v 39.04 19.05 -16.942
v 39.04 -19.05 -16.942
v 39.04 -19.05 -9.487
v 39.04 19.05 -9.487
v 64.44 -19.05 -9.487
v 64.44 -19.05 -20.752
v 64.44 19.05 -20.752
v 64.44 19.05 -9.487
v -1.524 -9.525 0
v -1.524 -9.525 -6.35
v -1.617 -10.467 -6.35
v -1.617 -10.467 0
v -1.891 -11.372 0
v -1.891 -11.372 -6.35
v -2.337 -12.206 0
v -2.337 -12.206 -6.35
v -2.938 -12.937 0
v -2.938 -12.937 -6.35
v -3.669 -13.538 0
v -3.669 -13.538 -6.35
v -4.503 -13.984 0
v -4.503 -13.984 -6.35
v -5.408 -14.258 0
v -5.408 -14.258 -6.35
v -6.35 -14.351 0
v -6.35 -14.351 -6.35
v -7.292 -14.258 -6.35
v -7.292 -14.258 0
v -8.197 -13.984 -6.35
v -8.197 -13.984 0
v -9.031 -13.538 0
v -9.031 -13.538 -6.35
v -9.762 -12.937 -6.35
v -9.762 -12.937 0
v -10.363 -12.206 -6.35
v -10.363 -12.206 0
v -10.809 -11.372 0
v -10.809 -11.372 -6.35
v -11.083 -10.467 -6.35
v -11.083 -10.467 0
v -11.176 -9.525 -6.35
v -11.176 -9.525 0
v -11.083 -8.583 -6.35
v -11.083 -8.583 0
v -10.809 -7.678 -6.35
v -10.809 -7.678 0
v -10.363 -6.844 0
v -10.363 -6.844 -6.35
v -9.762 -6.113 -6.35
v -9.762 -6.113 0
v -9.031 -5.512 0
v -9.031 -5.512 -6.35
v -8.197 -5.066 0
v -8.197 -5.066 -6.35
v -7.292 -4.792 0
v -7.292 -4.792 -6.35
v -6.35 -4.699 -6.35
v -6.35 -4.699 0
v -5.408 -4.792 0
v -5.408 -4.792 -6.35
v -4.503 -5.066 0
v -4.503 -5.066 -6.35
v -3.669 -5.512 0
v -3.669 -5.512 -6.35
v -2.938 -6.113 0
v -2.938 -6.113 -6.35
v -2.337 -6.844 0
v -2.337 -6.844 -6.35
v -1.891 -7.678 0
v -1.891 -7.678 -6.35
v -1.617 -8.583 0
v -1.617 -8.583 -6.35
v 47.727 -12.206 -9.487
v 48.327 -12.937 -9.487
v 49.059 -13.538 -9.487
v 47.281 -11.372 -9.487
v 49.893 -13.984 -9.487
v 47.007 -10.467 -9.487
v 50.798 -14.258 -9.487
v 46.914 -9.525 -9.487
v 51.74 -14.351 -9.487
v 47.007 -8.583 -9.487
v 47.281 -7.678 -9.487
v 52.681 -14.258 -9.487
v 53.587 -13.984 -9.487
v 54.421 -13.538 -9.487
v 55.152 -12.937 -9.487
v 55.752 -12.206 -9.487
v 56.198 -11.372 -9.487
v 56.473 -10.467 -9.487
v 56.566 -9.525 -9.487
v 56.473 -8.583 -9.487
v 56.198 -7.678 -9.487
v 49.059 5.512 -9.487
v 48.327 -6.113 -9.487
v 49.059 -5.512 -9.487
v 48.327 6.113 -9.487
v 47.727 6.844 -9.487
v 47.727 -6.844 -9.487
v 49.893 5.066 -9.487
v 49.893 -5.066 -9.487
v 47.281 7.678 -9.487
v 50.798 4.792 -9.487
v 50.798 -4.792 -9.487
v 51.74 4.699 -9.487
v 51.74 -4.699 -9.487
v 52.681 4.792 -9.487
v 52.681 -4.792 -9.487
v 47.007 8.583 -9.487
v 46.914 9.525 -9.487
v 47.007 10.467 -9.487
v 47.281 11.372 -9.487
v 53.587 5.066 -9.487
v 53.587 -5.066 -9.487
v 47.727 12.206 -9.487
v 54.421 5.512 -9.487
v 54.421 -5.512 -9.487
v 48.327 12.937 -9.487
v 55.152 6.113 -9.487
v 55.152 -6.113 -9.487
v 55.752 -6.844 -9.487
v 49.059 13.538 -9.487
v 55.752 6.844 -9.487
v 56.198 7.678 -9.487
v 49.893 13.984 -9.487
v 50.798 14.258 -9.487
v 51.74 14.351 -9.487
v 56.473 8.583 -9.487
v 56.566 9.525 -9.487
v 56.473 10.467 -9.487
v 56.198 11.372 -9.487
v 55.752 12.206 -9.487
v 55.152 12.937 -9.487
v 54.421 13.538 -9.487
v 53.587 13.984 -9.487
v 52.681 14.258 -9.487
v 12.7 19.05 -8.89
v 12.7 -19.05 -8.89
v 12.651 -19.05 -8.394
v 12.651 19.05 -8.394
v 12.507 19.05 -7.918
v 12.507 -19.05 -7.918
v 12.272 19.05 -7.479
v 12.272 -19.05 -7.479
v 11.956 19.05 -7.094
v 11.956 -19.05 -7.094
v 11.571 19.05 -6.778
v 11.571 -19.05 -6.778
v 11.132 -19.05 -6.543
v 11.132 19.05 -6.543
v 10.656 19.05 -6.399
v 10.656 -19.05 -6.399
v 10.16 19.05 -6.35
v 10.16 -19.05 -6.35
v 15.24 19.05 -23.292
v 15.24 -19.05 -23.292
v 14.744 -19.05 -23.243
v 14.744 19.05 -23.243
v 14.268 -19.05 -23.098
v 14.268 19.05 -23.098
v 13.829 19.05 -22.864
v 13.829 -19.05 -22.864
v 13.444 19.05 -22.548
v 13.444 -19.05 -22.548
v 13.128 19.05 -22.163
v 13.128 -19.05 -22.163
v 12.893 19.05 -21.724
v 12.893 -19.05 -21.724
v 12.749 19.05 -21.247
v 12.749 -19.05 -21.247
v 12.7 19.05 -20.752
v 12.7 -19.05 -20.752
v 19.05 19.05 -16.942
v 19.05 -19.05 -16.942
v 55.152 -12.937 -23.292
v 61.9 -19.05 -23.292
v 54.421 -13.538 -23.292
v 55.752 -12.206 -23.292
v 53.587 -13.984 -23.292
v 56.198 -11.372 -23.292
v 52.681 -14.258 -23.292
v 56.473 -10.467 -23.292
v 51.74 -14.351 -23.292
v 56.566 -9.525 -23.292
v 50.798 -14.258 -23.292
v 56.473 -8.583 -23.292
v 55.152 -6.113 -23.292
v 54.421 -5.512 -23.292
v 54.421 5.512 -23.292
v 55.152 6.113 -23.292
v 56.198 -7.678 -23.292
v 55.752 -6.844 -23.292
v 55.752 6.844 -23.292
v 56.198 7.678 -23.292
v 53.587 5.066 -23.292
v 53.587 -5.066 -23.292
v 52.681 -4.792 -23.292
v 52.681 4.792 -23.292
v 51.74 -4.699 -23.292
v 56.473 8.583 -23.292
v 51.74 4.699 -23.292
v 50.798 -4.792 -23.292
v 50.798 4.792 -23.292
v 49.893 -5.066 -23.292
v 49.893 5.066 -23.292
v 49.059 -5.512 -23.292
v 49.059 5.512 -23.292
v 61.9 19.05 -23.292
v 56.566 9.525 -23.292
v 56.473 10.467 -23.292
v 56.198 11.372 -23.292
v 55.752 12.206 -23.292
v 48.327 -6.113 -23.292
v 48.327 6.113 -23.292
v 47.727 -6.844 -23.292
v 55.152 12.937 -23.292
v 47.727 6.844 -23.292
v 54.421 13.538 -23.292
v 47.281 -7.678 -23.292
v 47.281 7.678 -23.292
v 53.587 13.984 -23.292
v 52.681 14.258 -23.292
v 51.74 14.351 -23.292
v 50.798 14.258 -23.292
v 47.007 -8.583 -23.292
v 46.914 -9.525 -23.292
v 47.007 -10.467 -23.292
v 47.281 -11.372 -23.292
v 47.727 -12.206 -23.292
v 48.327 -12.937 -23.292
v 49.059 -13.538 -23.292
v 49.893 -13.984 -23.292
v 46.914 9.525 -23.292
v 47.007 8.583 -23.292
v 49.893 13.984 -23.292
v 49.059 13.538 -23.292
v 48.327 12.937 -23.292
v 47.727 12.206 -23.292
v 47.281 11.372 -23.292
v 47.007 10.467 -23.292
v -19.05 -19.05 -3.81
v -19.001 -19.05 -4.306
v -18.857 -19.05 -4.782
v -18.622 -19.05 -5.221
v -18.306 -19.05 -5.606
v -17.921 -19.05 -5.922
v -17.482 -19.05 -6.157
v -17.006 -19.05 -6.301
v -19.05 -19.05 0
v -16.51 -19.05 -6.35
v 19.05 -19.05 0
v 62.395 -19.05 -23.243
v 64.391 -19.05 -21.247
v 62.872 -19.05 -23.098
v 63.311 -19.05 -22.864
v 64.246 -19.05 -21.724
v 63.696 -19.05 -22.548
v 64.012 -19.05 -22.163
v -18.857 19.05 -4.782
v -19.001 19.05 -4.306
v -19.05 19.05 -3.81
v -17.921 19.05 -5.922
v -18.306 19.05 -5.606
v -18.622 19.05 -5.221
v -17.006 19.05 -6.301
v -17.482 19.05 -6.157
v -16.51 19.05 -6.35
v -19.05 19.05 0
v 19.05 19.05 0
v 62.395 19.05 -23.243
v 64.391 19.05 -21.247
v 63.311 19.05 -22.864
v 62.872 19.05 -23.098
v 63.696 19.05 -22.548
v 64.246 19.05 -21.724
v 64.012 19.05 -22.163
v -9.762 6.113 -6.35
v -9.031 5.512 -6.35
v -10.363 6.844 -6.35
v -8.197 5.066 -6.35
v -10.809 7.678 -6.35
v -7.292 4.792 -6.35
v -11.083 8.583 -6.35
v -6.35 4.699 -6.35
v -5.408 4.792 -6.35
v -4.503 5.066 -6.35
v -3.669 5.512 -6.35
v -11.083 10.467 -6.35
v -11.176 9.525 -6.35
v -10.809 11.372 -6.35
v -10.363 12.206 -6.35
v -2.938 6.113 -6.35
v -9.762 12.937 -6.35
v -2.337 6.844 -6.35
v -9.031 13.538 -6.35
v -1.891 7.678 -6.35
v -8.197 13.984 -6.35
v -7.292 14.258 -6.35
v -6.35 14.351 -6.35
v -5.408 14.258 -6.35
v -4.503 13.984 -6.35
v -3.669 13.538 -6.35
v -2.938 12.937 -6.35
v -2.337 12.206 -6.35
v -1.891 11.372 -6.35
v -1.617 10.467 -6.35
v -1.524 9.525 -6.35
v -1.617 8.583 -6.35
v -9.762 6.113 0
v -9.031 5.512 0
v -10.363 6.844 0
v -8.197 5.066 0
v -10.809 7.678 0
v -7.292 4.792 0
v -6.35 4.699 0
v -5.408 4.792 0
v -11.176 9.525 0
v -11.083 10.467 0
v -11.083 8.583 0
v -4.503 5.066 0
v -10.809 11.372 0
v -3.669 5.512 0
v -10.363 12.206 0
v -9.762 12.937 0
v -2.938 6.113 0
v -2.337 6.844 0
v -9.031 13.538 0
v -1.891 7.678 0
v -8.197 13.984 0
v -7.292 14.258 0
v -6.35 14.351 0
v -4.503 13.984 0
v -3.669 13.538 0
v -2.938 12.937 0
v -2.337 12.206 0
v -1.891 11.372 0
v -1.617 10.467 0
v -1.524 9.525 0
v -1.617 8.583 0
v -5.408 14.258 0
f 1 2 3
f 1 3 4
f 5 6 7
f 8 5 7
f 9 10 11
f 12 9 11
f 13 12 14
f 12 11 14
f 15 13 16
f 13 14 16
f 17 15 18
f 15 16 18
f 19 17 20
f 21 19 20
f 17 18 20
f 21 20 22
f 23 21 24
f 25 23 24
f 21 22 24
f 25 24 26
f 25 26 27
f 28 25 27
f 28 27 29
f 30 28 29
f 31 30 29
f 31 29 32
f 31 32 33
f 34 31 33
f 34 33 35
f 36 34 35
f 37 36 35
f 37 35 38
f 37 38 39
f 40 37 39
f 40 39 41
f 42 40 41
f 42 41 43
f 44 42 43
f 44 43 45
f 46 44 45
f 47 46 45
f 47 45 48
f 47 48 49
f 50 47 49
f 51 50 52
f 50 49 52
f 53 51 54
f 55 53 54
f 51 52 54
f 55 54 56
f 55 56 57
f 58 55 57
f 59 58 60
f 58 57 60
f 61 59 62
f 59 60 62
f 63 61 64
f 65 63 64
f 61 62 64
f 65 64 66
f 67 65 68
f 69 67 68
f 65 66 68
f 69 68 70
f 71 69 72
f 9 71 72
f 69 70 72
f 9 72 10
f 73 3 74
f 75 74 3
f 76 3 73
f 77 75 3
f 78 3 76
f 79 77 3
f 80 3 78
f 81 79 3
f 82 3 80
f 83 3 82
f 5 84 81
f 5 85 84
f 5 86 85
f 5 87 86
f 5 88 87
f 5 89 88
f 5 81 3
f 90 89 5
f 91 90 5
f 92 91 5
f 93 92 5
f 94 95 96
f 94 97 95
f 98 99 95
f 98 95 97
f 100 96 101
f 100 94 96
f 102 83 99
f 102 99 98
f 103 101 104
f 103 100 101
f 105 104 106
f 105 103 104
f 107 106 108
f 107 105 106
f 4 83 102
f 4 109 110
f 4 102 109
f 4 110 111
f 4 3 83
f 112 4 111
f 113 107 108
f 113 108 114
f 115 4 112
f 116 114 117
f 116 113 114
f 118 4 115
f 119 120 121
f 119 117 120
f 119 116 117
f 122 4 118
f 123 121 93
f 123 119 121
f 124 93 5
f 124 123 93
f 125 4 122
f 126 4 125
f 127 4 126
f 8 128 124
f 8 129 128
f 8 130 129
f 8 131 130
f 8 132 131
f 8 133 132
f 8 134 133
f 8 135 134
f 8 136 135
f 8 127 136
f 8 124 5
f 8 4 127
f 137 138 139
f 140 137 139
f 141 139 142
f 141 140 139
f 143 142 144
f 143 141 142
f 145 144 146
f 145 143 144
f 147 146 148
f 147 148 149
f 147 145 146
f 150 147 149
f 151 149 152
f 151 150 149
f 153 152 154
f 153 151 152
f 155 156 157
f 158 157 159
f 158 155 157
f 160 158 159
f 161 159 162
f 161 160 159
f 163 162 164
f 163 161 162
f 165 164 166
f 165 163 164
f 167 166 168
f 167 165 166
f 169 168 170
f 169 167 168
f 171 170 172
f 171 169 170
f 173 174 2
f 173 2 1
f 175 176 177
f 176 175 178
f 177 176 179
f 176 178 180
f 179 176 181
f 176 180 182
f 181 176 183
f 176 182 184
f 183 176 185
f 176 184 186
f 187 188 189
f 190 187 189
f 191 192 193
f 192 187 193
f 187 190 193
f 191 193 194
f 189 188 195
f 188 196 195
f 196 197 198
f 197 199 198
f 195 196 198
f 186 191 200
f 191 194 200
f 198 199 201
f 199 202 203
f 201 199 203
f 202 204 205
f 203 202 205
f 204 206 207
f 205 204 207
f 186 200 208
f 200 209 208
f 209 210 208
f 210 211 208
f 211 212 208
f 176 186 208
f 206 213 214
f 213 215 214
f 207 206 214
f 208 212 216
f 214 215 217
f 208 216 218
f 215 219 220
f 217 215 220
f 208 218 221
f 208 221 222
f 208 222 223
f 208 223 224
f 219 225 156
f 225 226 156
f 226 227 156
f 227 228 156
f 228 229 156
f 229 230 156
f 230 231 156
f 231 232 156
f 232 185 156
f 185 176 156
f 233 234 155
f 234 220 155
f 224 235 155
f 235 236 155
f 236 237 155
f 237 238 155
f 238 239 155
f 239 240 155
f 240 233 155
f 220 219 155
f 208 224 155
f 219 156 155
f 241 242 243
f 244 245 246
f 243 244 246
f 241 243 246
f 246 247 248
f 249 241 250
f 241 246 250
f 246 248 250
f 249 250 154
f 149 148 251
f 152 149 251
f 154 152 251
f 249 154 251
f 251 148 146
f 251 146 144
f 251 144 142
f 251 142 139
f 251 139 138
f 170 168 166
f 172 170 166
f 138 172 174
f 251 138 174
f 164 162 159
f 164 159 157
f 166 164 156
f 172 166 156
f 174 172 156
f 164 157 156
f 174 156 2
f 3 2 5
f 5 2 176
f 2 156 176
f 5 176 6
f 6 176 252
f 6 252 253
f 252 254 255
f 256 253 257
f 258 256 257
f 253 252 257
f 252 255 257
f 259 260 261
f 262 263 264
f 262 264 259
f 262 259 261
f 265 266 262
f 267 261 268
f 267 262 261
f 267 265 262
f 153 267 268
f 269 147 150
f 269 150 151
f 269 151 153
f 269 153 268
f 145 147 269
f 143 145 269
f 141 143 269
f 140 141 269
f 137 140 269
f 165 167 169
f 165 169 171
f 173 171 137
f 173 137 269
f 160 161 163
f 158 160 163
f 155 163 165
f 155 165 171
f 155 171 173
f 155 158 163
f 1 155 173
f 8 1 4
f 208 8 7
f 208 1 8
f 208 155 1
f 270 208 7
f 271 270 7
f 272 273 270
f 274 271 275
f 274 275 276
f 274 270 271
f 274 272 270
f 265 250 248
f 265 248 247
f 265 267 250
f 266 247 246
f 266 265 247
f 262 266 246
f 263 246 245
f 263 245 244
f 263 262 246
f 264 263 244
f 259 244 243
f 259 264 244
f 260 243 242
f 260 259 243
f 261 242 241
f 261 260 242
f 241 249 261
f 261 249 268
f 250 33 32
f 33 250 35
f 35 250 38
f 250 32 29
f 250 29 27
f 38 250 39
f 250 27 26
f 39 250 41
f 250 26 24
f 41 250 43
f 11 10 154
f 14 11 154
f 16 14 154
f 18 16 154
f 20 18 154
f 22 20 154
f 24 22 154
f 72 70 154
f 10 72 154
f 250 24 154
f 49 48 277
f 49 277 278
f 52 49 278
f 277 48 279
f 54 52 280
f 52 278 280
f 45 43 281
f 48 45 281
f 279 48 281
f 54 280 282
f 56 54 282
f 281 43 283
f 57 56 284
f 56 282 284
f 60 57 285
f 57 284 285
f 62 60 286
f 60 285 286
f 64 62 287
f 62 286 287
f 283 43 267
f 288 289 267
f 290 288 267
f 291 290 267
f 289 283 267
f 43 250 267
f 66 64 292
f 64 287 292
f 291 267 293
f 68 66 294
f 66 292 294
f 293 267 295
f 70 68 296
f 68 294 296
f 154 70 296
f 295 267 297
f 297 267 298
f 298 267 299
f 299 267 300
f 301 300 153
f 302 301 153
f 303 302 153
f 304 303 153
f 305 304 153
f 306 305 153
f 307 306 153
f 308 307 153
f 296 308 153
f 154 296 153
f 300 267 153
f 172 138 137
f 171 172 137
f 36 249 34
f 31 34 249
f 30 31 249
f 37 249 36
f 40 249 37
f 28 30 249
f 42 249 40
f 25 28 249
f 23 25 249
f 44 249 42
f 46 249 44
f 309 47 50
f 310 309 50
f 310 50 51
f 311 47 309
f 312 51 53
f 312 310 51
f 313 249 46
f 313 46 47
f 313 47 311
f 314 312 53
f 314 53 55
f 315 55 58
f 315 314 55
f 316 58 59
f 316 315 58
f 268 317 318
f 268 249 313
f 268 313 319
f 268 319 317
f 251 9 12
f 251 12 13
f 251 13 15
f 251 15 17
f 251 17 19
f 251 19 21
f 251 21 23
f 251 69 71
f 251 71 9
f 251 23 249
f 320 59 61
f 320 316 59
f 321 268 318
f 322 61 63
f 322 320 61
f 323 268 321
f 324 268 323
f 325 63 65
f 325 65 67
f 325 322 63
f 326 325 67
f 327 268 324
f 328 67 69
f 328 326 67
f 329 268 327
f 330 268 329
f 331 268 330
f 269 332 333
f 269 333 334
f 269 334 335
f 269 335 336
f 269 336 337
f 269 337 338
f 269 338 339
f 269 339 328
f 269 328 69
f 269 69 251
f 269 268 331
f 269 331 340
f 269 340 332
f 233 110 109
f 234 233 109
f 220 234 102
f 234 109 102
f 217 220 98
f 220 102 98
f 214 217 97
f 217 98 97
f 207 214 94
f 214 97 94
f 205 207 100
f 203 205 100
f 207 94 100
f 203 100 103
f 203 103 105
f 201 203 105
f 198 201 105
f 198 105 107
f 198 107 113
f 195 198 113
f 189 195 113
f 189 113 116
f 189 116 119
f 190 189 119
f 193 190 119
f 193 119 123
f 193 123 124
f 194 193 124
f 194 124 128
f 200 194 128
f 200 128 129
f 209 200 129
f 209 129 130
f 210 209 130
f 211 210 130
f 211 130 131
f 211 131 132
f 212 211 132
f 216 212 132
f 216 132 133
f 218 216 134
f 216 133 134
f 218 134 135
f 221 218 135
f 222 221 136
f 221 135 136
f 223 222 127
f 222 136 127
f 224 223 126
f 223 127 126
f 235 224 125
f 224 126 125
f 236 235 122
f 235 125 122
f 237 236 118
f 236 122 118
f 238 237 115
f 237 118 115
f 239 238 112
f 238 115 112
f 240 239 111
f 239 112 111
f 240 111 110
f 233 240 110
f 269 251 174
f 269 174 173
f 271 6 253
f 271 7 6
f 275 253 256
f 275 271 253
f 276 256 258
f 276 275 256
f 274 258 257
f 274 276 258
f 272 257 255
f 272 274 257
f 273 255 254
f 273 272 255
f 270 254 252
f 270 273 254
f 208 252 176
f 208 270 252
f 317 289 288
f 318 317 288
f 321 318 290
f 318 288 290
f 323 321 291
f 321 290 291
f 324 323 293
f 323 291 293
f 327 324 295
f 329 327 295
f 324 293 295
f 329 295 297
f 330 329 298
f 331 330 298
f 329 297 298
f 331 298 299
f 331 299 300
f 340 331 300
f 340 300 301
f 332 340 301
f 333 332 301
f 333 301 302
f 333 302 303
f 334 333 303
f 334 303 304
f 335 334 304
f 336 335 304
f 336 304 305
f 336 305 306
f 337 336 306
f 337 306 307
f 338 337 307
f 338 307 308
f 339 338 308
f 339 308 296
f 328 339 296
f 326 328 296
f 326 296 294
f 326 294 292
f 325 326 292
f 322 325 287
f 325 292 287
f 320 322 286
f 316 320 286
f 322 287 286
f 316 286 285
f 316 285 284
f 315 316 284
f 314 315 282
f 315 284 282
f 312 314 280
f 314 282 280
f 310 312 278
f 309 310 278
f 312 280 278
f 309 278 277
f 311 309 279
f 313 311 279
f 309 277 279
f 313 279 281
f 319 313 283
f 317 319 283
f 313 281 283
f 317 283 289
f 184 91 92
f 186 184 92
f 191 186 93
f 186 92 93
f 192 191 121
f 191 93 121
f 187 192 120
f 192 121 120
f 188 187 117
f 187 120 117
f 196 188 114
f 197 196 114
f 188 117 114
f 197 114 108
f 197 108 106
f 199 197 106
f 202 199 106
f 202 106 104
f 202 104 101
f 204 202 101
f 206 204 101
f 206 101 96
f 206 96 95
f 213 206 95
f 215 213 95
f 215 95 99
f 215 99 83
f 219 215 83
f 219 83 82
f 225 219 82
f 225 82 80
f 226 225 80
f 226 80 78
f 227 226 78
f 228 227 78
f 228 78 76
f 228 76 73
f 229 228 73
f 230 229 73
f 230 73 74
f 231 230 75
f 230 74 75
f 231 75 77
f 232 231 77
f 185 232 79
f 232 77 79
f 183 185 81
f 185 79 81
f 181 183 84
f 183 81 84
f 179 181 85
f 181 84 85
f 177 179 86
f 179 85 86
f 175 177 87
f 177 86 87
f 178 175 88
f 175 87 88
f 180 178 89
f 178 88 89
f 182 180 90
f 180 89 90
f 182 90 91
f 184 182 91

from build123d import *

# Parameters (mm, degrees)
SKETCH1_W           = 38.1
SKETCH1_H           = 38.1
BOSS_EXTRUDE1_DEPTH = 6.35
SKETCH2_W           = 6.35
SKETCH2_H           = 38.1
BOSS_EXTRUDE2_DEPTH = 16.9418
SKETCH4_W           = 6.35
SKETCH4_H           = 38.1
BOSS_EXTRUDE3_DEPTH = 45.3898
SKETCH5_W           = 25.4
SKETCH5_H           = 38.1
BOSS_EXTRUDE4_DEPTH = 7.4549
SKETCH6_R           = 4.826
CUT_EXTRUDE1_DEPTH  = 70.299458232
SKETCH8_R           = 4.826
CUT_EXTRUDE2_DEPTH  = 69.600040729
FILLET7_R           = 2.54


with BuildPart() as part:
    # Sketch1 → Boss-Extrude1 (new body)
    with BuildSketch(Plane.XY):
        Rectangle(SKETCH1_W, SKETCH1_H)
    extrude(amount=-BOSS_EXTRUDE1_DEPTH)

    # Sketch2 → Boss-Extrude2 (add)
    with BuildSketch(Plane(origin=(0, 0, -6.35), x_dir=(-1, 0, 0), z_dir=(0, 0, -1))):
        with Locations((-15.875, 0)):
            Rectangle(SKETCH2_W, SKETCH2_H)
    extrude(amount=BOSS_EXTRUDE2_DEPTH)

    # Sketch4 → Boss-Extrude3 (add)
    with BuildSketch(Plane(origin=(19.05, 0, 0), x_dir=(0, 0, -1), z_dir=(1, 0, 0))):
        with Locations((20.1168, 0)):
            Rectangle(SKETCH4_W, SKETCH4_H)
    extrude(amount=BOSS_EXTRUDE3_DEPTH)

    # Sketch5 → Boss-Extrude4 (add)
    with BuildSketch(Plane.XY.offset(-16.9418)):
        with Locations((51.7398, 0)):
            Rectangle(SKETCH5_W, SKETCH5_H)
    extrude(amount=BOSS_EXTRUDE4_DEPTH)

    # Sketch6 → Cut-Extrude1 (cut, through all)
    with BuildSketch(Plane(origin=(0, 0, -6.35), x_dir=(-1, 0, 0), z_dir=(0, 0, -1))):
        with Locations((6.35, 9.525)):
            Circle(SKETCH6_R)
        with Locations(Location((6.35, -9.525, 0), (0, 0, 180))):
            Circle(SKETCH6_R)
    extrude(amount=-CUT_EXTRUDE1_DEPTH, mode=Mode.SUBTRACT)

    # Sketch8 → Cut-Extrude2 (cut, through all)
    with BuildSketch(Plane.XY.offset(-9.4869)):
        with Locations((51.7398, -9.525)):
            Circle(SKETCH8_R)
        with Locations(Location((51.7398, 9.525, 0), (0, 0, 180))):
            Circle(SKETCH8_R)
    extrude(amount=-CUT_EXTRUDE2_DEPTH, mode=Mode.SUBTRACT)

    # Fillet7
    fillet7_edges = [part.edges().sort_by_distance(p)[0] for p in [
        (-19.05, 0, -6.35),
        (12.7, 0, -6.35),
        (12.7, 0, -23.2918),
        (64.4398, 0, -23.2918),
    ]]
    fillet(fillet7_edges, radius=FILLET7_R)


solid = part.part
